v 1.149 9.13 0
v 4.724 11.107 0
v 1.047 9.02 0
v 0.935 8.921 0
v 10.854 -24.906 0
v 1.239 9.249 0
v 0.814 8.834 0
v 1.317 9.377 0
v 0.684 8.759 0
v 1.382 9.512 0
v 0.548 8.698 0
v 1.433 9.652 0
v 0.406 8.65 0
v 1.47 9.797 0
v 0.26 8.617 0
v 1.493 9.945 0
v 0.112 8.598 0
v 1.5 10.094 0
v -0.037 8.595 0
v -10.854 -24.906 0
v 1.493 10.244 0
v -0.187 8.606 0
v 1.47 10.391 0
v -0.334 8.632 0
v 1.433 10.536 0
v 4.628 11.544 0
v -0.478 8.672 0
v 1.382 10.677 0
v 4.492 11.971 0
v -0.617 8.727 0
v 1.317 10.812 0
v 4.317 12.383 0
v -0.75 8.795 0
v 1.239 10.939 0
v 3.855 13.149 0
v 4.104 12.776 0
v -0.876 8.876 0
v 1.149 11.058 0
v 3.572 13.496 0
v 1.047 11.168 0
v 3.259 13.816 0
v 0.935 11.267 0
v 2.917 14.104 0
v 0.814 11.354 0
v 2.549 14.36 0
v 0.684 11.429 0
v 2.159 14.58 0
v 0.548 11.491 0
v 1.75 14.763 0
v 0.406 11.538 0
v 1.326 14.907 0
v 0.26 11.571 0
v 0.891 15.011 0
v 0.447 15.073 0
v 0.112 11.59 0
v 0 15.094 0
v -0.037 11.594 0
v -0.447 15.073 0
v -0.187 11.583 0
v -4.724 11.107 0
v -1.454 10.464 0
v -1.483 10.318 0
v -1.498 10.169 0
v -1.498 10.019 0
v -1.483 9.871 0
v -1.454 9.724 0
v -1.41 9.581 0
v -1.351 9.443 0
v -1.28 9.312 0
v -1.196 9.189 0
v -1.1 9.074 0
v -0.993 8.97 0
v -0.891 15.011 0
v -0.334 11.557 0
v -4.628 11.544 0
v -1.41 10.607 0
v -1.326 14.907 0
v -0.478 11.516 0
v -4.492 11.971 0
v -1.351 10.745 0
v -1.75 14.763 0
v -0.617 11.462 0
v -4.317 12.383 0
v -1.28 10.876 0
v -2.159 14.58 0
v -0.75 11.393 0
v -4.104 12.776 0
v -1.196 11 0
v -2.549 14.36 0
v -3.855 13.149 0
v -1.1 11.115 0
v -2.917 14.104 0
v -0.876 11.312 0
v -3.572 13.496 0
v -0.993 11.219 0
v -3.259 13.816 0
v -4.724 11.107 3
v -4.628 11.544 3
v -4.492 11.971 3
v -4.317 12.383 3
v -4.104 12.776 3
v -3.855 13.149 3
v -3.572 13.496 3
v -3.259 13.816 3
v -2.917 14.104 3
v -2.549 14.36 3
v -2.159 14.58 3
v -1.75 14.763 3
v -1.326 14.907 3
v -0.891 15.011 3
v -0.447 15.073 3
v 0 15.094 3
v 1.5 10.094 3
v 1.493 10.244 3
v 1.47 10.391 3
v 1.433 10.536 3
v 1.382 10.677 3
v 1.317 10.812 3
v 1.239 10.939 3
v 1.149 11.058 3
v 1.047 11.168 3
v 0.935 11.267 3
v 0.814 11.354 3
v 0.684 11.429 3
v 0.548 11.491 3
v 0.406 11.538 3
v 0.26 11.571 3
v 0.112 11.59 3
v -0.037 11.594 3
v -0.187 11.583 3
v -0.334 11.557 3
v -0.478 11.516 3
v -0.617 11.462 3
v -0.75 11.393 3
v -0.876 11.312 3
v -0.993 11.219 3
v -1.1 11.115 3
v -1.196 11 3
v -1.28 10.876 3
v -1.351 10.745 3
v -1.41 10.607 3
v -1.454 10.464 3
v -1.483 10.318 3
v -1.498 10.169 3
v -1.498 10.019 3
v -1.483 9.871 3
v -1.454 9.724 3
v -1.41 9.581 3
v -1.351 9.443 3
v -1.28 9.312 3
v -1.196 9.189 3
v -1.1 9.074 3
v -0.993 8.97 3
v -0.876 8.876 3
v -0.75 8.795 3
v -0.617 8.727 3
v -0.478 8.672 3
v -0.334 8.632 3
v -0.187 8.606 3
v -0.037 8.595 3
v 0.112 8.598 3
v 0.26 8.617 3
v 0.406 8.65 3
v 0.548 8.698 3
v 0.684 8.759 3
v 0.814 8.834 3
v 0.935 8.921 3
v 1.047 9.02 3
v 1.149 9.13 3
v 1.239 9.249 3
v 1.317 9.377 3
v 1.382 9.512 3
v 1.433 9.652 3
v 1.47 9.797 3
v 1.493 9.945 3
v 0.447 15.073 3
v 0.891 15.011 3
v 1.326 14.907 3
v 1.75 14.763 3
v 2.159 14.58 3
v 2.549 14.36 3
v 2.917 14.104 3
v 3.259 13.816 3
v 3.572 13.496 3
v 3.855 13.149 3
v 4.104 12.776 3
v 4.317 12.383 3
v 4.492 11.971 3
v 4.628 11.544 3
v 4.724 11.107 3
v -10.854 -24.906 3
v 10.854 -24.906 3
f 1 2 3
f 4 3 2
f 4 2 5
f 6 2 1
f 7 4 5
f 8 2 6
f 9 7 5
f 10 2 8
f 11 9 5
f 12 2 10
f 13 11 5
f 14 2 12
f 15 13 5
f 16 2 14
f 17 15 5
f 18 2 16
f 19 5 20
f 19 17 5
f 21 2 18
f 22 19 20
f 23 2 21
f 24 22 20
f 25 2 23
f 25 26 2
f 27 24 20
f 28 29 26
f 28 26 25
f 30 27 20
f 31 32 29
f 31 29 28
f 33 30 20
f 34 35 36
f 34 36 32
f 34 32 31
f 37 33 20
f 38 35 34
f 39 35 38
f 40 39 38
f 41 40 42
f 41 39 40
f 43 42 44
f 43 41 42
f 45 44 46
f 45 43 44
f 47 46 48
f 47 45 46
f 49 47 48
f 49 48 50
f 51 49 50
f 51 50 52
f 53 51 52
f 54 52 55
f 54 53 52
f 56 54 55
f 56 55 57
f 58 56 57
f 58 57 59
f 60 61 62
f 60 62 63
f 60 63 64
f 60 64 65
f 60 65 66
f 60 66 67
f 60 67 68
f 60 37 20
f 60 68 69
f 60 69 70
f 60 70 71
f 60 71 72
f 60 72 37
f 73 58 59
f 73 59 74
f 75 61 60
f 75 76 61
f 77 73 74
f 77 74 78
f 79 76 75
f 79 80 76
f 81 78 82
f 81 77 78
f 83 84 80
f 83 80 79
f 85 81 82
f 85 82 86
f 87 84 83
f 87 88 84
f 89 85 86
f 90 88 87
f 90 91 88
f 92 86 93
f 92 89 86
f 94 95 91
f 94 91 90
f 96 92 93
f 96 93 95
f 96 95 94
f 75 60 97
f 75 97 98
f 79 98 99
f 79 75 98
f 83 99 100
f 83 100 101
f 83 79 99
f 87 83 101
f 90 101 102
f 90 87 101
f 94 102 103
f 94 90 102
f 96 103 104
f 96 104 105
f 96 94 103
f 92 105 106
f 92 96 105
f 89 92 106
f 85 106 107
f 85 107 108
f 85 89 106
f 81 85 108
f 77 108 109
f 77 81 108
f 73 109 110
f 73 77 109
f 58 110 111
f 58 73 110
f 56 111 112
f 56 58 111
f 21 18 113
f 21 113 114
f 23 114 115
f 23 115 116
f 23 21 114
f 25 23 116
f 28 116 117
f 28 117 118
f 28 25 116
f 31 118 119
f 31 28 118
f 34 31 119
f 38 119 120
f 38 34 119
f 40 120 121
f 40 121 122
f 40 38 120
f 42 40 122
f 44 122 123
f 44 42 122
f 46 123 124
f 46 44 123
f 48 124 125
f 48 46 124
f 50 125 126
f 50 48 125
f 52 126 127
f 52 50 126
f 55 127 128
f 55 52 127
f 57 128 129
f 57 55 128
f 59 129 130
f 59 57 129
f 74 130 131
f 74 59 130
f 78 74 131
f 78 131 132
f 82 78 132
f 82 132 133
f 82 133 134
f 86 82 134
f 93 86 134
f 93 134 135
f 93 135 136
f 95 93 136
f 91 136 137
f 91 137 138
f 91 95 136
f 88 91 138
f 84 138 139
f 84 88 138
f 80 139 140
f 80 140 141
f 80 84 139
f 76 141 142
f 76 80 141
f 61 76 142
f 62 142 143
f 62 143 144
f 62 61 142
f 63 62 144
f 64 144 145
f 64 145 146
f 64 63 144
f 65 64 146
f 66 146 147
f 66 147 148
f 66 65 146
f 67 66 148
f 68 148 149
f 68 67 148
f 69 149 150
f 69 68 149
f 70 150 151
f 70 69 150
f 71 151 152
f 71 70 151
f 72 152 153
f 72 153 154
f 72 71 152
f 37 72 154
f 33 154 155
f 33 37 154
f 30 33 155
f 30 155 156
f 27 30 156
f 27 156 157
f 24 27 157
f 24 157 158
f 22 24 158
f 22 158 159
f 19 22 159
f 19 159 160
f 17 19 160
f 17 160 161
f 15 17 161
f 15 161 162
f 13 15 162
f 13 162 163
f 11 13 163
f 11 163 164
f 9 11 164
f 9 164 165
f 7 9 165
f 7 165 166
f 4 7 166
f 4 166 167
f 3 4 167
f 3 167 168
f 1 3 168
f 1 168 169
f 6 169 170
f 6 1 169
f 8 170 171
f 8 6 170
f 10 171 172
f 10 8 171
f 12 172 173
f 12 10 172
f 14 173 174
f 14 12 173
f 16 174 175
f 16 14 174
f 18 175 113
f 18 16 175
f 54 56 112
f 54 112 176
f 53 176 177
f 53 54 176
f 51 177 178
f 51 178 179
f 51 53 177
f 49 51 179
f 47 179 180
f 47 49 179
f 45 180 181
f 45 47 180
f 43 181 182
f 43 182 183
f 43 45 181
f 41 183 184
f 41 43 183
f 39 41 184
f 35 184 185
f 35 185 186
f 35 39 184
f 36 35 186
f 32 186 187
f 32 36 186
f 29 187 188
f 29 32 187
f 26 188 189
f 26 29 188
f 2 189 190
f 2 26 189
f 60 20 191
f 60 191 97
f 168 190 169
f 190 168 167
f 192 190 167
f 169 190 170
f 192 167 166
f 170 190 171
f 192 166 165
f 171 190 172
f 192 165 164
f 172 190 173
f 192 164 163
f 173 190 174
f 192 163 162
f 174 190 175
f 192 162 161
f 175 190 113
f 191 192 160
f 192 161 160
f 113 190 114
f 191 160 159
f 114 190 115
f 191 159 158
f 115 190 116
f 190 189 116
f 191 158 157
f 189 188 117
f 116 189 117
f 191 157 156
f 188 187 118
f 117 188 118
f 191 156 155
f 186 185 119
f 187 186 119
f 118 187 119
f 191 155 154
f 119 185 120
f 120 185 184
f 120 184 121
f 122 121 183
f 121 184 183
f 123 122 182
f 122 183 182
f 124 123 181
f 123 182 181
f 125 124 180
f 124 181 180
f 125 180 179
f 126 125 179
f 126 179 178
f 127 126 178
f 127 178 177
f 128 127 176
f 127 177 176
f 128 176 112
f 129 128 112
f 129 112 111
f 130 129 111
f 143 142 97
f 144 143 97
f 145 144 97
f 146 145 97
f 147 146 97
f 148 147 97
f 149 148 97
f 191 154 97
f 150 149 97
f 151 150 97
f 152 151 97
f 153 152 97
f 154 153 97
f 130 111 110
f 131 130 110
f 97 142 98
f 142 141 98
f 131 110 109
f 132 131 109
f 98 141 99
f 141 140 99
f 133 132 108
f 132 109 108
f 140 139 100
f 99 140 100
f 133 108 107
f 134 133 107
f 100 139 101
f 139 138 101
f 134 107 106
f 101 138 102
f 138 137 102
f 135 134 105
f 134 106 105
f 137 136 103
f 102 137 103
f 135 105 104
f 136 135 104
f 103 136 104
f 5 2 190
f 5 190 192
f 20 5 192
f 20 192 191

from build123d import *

# Parameters (mm, degrees)
SKETCH1_R           = 1.5
BOSS_EXTRUDE1_DEPTH = 3


with BuildPart() as part:
    # Sketch1 → Boss-Extrude1 (new body)
    with BuildSketch(Plane.XY):
        with BuildLine():
            Line((10.853563951, -24.90575827), (-10.853563951, -24.90575827))
            Line((-10.853563951, -24.90575827), (-4.723810622, 11.106542541))
            ThreePointArc((-4.723810622, 11.106542541), (-3.090959868, 13.964026902), (0, 15.09424173))
            ThreePointArc((0, 15.09424173), (3.090959868, 13.964026902), (4.723810622, 11.106542541))
            Line((4.723810622, 11.106542541), (10.853563951, -24.90575827))
        make_face()
        with Locations((0, 10.09424173)):
            Circle(SKETCH1_R, mode=Mode.SUBTRACT)
    extrude(amount=BOSS_EXTRUDE1_DEPTH)


solid = part.part
